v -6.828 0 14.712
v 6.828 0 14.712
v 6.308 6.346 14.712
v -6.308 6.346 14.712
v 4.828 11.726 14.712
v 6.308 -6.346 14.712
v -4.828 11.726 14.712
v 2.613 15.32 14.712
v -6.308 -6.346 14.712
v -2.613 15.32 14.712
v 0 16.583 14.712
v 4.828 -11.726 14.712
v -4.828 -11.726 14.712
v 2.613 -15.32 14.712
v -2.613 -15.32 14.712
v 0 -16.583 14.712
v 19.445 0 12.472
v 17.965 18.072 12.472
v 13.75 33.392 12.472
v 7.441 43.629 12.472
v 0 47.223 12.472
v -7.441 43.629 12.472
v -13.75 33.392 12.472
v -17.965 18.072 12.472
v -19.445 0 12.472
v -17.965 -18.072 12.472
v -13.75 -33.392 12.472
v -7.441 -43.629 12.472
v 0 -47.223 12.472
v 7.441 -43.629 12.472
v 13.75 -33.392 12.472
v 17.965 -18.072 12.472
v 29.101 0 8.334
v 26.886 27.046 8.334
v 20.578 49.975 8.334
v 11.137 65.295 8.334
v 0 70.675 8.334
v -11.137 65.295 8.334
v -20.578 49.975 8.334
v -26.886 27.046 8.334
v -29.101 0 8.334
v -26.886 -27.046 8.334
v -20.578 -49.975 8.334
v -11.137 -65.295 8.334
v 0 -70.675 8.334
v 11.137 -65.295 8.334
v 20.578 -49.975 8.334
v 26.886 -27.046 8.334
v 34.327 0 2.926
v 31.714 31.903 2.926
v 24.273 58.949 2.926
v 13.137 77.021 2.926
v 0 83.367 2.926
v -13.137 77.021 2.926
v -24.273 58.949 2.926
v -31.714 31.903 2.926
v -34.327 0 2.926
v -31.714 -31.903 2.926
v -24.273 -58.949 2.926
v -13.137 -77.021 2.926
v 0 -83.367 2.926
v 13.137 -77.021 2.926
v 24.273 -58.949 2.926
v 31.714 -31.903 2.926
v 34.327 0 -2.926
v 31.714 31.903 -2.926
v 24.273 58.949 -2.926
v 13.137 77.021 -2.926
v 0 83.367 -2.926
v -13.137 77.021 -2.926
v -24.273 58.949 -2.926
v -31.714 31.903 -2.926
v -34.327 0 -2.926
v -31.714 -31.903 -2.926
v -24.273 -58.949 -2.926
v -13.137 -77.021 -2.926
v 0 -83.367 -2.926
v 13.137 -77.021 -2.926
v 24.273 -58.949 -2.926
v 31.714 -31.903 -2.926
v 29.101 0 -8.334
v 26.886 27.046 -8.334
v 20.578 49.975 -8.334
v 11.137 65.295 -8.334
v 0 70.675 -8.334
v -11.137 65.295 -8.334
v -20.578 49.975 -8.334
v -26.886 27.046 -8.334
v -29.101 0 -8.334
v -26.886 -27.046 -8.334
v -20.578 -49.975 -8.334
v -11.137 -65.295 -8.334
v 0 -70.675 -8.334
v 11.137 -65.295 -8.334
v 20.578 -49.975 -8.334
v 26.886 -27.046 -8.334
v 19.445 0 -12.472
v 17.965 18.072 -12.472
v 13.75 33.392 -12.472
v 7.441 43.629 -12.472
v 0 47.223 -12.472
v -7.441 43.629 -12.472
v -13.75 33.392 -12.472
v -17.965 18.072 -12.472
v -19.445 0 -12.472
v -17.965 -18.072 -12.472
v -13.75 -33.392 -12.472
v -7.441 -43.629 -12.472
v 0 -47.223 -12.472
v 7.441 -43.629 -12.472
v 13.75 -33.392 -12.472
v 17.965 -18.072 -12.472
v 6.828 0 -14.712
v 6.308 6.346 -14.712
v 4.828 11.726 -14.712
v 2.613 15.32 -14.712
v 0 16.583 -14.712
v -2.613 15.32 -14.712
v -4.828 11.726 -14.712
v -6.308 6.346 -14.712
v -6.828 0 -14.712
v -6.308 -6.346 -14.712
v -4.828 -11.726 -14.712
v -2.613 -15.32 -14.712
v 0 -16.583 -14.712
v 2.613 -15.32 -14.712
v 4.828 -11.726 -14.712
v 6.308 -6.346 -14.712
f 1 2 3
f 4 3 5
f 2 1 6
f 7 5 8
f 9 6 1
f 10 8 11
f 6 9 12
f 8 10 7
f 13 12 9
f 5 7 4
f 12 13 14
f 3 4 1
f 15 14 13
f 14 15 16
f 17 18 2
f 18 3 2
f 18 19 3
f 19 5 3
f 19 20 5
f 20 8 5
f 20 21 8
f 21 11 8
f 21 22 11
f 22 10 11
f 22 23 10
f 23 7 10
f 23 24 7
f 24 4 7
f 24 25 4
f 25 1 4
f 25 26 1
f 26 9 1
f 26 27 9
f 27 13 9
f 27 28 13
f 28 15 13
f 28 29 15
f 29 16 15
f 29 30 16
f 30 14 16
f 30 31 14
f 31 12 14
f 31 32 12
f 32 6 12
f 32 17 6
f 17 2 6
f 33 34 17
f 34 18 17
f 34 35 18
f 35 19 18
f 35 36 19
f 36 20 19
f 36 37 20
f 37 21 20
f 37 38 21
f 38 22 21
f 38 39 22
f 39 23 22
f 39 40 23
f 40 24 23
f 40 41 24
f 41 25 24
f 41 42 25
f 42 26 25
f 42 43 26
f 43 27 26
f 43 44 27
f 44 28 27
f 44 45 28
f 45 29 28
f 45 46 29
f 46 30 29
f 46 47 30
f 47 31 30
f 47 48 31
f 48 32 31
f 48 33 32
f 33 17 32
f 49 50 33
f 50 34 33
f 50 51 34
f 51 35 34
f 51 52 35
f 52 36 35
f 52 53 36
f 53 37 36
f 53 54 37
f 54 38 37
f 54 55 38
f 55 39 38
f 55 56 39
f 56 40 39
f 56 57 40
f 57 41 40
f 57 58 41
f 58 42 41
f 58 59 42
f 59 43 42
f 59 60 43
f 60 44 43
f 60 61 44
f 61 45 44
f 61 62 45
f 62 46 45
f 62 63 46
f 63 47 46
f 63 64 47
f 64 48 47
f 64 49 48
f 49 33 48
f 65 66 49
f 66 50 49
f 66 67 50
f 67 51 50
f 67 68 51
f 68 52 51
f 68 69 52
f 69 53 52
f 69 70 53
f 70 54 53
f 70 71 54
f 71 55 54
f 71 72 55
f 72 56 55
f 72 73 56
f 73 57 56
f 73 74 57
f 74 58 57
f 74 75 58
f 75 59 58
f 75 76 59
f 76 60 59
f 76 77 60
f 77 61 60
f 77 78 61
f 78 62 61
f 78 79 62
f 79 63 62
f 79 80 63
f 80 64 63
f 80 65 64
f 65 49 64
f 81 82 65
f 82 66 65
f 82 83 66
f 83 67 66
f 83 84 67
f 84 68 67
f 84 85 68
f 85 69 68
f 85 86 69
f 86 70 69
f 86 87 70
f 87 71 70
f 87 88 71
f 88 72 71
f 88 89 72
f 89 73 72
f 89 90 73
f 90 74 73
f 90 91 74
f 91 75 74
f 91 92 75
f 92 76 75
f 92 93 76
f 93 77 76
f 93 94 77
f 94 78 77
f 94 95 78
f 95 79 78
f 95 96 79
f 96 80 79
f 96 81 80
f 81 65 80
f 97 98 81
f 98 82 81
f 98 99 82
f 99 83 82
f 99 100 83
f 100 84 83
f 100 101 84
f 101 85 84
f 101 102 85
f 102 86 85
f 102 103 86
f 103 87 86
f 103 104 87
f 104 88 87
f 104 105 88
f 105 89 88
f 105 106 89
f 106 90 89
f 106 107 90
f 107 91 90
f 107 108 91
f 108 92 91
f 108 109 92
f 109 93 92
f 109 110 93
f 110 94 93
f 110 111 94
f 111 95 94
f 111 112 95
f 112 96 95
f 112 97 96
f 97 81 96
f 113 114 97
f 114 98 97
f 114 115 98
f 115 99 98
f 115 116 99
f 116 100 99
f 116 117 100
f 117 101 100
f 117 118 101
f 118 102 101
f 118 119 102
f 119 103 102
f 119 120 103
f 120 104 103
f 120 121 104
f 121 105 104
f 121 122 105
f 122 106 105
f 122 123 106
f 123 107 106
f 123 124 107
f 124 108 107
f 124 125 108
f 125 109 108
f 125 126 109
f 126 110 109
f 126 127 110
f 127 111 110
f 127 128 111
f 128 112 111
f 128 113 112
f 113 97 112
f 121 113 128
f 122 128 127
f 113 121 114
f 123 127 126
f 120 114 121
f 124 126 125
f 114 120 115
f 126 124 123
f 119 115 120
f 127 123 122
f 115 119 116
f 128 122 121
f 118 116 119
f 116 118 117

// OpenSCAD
// Generated by SolidPython 1.0.1 on 2020-07-29 00:46:48


scale(v = [7, 17, 3]) {
	sphere(r = 5);
}
/***********************************************
*********      SolidPython code:      **********
************************************************
 
# import packages: SolidPython
from solid import *
from solid.utils import *
from itertools import chain, combinations, permutations


class Resize:

    def __init__(self, scad_file):
        self.scad_file = scad_file
        #self.scad_file = import_scad(scad_file)
        # cone/cylinder param:
        self.r1 = 0
        self.r2 = 0
        self.h = 0
        # rectangular prism param:
        self.w = 0
        self.l = 0
        # ellipse param:
        self.r = 0

    # import OpenScad code (file name corresponds to shape)


    # classify shape + parameters
    def assign(self, param1, param2, param3):
        if self.scad_file == 'cone.scad':
            self.r1 = param1
            self.r2 = param2
            self.h = param3
        elif self.scad_file == 'cylinder.scad':
            self.r1 = param1
            self.r2 = param2
            self.h = param3
        elif self.scad_file == 'rectangularPrism.scad':
            self.h = param1
            self.l = param2
            self.w = param3
        else:
            self.r = param1
            self.h = param2

    # resize parameters
    def iterate(self):
        x = range(3, 20, 2)
        i = 1
        if self.scad_file == 'cone.scad':
            tempList = list(permutations(x, 2))
            for temp in tempList:
                param1 = temp[0]
                param2 = temp[1]
                filepath = 'produced_scad_files/' + 'cone' + str(param1) + '_' + str(param2) + '_' + '.scad'
                scad_render_to_file(cylinder(h=param1, r1=param2, r2=0), filepath)

        elif self.scad_file == 'cylinder.scad':
            tempList = list(permutations(x, 3))
            for temp in tempList:
                param1 = temp[0]
                param2 = temp[1]
                filepath = 'produced_scad_files/' + 'cylinder' + str(param1) + '_' + str(param2) + '_' + '.scad'
                scad_render_to_file(cylinder(h=param1, r1=param2, r2=param2), filepath)

        elif self.scad_file == 'rectangularPrism.scad':
            tempList = list(permutations(x, 3))
            for temp in tempList:
                param1 = temp[0]
                param2 = temp[1]
                param3 = temp[2]
                filepath = 'produced_scad_files/' + 'rectangularPrism' + str(param1) + '_' + str(param2) + '_' + str(
                    param3) + '.scad'
                scad_render_to_file(cube(size=(param1, param2, param3)), filepath)

        elif self.scad_file == 'ellipse.scad':
            tempList = list(permutations(x, 4))
            for temp in tempList:
                param1 = temp[0]
                param2 = temp[1]
                param3 = temp[2]
                param4 = temp[3]
                filepath = 'produced_scad_files/' + 'ellipse' + str(param1) + '_' + str(param2) + '_' + str(param3) + '_' + str(param4) + '.scad'
                scad_render_to_file(scale([param1, param2, param3])(sphere(r=param4)), filepath)

    def render_to_scadfile(self):
        scad_render_to_file(scad, 'example.scad') 
 
************************************************/
